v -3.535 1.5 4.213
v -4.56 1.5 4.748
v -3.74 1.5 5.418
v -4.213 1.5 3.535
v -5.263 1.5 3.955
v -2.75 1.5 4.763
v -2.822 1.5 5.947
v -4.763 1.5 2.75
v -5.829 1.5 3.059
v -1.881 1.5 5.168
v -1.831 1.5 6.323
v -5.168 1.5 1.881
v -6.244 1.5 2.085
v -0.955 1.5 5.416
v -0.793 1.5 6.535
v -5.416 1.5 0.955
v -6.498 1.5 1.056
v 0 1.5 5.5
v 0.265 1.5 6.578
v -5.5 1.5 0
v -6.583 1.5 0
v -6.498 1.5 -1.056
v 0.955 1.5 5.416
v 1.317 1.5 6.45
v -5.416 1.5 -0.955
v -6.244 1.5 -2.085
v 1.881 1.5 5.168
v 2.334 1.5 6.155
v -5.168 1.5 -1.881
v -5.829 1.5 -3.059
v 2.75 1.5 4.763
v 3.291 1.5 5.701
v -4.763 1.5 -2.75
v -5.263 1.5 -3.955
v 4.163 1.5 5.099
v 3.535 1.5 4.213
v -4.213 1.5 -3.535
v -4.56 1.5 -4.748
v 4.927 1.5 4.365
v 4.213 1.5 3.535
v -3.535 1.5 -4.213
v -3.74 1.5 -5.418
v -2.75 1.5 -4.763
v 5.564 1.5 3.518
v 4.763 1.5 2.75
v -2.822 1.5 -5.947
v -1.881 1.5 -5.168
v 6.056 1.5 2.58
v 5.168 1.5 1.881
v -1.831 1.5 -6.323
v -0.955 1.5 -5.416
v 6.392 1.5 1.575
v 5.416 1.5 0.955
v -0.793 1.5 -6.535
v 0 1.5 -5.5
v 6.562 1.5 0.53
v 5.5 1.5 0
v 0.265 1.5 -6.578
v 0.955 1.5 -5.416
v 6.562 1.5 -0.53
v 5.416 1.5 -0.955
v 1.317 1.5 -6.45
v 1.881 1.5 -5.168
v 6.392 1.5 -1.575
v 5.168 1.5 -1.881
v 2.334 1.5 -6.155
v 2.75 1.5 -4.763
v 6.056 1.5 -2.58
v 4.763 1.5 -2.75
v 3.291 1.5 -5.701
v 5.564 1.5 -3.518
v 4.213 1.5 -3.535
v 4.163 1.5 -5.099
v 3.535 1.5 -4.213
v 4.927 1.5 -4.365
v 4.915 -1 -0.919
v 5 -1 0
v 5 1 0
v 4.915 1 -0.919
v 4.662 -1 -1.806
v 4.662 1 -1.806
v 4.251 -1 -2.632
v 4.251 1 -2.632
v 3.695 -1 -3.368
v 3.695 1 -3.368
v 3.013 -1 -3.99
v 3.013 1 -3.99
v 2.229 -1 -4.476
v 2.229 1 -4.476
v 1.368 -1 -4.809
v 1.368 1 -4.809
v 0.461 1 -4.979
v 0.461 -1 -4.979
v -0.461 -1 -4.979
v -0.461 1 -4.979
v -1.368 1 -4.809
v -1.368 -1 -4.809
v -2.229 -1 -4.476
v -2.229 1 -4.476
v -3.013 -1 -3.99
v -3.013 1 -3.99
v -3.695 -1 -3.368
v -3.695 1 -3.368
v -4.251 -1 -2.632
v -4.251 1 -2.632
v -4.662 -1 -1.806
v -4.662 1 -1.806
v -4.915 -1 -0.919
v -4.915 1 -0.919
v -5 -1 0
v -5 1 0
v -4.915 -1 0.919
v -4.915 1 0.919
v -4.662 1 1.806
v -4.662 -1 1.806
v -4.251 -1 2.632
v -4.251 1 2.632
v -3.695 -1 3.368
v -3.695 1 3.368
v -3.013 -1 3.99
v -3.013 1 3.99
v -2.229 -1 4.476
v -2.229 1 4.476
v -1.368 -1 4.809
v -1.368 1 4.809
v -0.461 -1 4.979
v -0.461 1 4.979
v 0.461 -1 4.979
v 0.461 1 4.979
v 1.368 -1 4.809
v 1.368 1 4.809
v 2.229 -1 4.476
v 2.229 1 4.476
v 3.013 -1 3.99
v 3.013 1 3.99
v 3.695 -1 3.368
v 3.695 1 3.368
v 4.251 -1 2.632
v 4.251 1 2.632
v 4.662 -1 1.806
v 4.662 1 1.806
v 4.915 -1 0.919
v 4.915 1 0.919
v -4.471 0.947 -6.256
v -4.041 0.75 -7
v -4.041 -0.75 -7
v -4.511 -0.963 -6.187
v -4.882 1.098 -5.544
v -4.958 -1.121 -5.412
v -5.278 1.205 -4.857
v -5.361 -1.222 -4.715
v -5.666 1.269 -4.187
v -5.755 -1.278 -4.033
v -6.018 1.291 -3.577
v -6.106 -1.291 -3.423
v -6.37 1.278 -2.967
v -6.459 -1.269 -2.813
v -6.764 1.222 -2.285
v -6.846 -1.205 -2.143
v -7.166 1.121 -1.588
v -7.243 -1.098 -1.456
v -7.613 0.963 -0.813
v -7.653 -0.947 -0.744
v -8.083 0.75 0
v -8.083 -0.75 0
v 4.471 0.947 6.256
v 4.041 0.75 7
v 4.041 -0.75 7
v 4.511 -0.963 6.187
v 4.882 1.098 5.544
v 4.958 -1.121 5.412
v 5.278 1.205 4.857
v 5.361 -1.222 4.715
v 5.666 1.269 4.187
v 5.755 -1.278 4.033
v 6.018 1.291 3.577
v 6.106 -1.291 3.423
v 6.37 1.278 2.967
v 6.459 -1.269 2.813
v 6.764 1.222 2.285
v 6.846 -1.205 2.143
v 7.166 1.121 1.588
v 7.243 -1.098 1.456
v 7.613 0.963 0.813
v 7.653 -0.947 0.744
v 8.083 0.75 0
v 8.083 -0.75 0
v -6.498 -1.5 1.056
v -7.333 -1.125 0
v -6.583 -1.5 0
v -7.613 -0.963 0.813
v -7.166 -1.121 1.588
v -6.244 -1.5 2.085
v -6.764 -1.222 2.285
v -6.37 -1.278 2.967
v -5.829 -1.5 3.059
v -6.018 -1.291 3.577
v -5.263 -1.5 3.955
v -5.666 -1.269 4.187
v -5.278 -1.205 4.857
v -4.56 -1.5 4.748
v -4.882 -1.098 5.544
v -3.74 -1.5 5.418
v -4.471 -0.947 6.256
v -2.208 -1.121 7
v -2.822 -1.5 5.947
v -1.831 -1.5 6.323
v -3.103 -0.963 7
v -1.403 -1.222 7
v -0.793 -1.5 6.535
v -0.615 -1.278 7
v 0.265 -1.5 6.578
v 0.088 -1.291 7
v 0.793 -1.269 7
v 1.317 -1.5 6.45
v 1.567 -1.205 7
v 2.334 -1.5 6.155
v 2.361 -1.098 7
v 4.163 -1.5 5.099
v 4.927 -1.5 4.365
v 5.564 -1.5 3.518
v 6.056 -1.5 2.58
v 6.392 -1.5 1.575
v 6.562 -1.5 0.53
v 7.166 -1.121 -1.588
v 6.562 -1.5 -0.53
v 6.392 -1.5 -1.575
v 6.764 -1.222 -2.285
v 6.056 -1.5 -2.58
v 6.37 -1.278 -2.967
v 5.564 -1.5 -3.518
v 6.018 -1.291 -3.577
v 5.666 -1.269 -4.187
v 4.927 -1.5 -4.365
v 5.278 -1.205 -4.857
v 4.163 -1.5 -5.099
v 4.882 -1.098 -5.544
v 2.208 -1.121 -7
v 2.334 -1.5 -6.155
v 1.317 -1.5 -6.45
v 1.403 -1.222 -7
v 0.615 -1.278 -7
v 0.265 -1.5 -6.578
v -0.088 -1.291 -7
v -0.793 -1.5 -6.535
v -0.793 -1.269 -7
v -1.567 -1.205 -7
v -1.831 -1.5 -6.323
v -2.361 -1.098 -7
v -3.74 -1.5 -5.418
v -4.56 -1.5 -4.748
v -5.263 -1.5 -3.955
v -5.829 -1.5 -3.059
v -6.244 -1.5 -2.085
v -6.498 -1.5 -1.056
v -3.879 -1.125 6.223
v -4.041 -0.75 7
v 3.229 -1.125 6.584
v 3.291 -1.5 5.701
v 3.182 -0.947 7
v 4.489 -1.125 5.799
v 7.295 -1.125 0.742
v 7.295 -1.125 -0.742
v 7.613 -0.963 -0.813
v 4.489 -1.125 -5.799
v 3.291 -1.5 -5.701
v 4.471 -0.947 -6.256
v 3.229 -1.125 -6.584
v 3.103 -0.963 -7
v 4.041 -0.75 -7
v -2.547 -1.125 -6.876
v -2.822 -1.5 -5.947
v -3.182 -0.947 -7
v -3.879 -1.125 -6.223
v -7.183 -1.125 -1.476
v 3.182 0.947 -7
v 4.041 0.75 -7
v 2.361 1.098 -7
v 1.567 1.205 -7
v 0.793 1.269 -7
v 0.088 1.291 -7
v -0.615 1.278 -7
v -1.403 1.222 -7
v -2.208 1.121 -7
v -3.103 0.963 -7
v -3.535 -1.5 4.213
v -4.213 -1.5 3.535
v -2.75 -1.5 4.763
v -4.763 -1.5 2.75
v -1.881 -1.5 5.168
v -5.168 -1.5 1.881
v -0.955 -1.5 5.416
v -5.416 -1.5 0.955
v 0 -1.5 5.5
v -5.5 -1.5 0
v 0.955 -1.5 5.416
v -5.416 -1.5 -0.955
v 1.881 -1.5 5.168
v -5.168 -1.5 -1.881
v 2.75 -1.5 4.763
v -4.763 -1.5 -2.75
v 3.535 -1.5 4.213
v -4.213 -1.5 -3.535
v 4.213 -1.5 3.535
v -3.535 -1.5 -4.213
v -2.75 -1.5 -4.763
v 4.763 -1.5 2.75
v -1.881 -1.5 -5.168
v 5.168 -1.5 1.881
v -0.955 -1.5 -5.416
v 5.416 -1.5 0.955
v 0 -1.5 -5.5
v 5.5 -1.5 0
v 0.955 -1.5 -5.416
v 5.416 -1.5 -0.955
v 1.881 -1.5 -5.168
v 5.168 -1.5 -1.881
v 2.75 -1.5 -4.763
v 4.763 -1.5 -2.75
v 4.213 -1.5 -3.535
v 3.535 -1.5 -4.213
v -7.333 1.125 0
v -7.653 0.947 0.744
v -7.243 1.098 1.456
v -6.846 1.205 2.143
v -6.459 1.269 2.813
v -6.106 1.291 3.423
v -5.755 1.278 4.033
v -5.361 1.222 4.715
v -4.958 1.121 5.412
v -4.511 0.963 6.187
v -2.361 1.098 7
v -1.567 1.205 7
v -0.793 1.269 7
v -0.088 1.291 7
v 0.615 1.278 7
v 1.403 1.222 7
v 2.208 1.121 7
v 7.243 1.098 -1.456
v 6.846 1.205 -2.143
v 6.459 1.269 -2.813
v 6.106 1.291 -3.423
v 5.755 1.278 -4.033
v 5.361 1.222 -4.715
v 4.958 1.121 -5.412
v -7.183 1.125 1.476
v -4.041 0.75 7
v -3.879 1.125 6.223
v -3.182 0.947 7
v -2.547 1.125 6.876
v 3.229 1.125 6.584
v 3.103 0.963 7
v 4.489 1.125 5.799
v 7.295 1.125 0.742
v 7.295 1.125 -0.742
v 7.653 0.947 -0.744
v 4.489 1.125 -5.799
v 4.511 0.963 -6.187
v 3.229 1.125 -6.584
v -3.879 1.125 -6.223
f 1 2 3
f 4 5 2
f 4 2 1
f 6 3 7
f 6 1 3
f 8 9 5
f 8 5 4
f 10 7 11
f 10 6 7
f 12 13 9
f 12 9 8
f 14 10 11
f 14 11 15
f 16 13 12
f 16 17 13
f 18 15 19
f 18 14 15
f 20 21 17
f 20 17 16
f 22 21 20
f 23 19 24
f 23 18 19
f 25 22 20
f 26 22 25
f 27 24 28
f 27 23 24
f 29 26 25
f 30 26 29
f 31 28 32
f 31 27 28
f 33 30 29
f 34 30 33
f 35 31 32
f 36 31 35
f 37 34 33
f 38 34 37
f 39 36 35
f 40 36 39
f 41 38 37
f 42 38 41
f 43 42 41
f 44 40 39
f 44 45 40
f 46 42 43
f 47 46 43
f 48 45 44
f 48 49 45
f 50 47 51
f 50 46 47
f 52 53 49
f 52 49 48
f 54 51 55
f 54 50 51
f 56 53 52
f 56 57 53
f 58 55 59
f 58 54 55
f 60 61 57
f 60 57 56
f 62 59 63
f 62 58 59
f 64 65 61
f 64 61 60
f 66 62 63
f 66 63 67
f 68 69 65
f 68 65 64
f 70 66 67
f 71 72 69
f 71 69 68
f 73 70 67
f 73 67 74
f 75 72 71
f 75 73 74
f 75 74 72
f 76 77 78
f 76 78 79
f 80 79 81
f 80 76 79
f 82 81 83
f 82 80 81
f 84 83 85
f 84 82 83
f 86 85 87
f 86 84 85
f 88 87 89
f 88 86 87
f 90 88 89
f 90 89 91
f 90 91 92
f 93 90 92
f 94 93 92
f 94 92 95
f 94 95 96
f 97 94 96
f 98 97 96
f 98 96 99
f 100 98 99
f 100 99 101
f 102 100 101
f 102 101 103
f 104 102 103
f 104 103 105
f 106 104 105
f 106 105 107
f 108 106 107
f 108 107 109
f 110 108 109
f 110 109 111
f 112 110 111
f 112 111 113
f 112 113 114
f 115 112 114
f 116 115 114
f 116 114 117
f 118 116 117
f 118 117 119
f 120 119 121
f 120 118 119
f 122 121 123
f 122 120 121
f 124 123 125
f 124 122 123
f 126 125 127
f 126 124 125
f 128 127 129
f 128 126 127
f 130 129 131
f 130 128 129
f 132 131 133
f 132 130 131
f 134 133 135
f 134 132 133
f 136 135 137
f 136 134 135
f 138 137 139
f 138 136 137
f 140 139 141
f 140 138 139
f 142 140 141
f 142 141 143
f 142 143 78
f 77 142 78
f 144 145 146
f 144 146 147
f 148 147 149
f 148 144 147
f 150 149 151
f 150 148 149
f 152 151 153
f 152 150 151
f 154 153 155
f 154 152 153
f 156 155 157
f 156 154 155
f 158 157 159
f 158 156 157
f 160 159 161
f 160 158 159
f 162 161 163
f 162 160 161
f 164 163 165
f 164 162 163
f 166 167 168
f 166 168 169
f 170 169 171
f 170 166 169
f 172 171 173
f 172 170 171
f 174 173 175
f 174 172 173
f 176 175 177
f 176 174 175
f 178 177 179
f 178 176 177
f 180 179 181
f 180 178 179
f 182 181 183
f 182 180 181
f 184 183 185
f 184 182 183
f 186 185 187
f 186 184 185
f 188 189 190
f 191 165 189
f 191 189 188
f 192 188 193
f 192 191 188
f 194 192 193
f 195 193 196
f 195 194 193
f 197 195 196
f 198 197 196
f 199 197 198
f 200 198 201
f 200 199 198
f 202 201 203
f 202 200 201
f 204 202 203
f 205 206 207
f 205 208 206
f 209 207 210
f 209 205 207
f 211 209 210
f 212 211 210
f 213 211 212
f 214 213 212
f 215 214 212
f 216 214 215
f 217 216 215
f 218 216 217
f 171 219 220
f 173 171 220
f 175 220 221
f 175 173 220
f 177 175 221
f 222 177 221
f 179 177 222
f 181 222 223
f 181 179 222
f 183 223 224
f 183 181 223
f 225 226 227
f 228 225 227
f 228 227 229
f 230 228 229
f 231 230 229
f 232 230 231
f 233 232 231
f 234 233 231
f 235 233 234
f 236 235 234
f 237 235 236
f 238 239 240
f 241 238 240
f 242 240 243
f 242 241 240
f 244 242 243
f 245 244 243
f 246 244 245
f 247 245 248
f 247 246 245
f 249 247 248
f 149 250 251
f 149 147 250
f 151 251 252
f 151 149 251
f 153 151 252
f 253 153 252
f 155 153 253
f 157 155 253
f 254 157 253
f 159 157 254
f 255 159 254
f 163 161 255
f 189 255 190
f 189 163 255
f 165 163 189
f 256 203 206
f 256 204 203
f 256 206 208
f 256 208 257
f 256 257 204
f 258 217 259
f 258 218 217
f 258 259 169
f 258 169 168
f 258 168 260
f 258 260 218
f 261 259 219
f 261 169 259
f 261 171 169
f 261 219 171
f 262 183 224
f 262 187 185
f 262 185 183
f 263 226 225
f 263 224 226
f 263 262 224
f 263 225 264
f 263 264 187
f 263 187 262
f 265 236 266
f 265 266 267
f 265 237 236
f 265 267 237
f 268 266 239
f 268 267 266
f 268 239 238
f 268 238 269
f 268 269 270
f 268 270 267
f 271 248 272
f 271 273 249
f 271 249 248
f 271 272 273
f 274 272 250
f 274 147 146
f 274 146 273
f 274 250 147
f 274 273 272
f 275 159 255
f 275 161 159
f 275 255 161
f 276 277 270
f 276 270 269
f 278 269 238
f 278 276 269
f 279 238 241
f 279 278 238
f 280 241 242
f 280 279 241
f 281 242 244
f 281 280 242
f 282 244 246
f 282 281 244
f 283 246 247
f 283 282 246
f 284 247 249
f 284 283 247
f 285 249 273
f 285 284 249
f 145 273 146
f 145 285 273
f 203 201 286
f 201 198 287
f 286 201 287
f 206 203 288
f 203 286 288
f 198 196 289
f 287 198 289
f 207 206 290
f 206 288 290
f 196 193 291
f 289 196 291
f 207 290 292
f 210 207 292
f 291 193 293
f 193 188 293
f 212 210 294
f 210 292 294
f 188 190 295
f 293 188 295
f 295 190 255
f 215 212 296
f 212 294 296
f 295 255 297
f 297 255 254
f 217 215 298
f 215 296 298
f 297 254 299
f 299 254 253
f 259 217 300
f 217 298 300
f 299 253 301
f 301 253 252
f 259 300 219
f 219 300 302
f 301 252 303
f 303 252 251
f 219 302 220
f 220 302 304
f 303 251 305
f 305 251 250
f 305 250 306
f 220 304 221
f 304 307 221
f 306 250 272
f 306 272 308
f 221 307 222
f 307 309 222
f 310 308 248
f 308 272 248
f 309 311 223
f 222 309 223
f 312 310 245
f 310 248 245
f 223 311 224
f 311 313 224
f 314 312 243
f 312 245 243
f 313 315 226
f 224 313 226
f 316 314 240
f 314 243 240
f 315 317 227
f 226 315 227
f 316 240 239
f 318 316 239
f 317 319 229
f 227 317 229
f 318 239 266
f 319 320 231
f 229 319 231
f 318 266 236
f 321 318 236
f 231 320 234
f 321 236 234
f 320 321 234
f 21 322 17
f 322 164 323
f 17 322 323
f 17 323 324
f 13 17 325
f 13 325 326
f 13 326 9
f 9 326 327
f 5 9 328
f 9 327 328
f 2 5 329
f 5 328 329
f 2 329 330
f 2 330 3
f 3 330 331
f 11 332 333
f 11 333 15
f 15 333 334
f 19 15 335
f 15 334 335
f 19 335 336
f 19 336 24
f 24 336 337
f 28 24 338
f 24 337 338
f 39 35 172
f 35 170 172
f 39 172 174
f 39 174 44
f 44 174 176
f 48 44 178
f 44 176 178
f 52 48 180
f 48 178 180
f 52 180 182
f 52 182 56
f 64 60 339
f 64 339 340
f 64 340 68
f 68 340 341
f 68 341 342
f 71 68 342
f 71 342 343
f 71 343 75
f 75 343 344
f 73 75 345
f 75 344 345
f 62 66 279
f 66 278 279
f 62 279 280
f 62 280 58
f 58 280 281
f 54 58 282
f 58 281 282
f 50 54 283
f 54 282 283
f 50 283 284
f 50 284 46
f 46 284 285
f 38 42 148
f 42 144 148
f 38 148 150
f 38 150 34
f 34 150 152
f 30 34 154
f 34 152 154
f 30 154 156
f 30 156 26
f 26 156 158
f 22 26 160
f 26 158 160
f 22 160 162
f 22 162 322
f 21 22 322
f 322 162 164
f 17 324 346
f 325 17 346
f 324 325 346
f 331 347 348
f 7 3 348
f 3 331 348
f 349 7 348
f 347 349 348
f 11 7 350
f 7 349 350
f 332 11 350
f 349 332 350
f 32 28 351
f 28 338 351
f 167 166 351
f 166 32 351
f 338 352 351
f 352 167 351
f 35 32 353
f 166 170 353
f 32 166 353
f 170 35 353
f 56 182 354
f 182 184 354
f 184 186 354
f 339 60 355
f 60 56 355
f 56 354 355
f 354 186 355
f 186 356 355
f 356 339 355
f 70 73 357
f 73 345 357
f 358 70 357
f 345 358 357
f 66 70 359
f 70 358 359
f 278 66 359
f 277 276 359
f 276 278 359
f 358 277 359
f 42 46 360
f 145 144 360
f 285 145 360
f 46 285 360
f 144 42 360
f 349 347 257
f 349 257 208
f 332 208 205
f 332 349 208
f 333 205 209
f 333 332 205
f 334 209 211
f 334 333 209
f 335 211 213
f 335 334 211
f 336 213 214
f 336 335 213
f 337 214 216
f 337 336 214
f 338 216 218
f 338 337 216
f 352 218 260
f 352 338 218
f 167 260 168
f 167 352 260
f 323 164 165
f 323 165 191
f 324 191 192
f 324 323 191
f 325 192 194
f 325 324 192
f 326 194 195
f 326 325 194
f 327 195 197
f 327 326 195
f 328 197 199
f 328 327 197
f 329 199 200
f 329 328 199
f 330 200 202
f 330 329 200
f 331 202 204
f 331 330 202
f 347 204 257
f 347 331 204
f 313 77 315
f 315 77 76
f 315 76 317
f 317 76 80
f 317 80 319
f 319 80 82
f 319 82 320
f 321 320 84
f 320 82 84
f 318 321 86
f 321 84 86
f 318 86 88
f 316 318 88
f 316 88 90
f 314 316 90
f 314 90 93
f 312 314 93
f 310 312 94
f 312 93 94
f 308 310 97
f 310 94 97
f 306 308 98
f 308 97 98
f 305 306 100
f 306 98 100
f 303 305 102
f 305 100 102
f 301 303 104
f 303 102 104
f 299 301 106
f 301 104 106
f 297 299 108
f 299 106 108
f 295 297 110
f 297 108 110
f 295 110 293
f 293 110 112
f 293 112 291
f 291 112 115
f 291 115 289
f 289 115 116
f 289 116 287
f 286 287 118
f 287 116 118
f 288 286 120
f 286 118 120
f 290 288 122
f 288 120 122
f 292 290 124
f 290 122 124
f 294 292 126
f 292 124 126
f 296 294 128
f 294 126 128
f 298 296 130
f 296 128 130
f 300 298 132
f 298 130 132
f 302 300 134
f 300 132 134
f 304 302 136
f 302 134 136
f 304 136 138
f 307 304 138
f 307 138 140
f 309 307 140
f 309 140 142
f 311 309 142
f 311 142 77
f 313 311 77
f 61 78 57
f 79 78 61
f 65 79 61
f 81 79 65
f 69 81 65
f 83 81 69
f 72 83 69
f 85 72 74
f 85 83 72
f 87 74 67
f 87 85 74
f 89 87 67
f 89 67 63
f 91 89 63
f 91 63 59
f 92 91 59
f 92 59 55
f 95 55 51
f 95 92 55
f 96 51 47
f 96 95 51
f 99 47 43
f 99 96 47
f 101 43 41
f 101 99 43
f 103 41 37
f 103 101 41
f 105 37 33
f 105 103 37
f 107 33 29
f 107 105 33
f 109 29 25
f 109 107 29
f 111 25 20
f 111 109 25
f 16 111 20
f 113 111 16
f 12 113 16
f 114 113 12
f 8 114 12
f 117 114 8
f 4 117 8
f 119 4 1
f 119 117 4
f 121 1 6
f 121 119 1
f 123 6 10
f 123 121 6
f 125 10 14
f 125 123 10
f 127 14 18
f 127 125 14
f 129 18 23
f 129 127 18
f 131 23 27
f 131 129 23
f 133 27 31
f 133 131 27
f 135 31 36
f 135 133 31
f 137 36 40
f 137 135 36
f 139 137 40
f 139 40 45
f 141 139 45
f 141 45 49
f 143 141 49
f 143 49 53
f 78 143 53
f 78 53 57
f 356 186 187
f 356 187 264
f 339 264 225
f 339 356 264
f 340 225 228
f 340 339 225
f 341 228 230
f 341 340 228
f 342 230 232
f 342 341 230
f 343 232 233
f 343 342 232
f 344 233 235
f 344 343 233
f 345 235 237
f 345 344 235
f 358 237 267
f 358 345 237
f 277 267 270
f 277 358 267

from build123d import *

# Parameters (mm, degrees)
SKETCH1_R           = 5
BOSS_EXTRUDE1_DEPTH = 1.5
CHAMFER1_SIZE       = 0.5


with BuildPart() as part:
    # Sketch1 → Boss-Extrude1 (new body, symmetric)
    with BuildSketch(Plane(origin=(0, 0, 0), x_dir=(1, 0, 0), z_dir=(0, 1, 0))):
        Polygon((8.082903769, 0), (4.041451884, 7), (-4.041451884, 7), (-8.082903769, 0), (-4.041451884, -7), (4.041451884, -7), align=None)
        Circle(SKETCH1_R, mode=Mode.SUBTRACT)
    extrude(amount=BOSS_EXTRUDE1_DEPTH, both=True)

    # Sketch2 → Cut-Revolve1 (revolve, cut)
    with BuildSketch(Plane.XY):
        Polygon((-8.082903769, 1.5), (-6.582903769, 1.5), (-8.082903769, 0.75), align=None)
        Polygon((-8.082903769, -0.75), (-8.082903769, -1.5), (-6.582903769, -1.5), align=None)
    revolve(axis=Axis((0, -1000, 0), (0, 1, 0)), mode=Mode.SUBTRACT)

    # Chamfer1
    chamfer1_edges = [part.edges().sort_by_distance(p)[0] for p in [
        (-5, -1.5, 0),
        (-5, 1.5, 0),
    ]]
    chamfer(chamfer1_edges, length=CHAMFER1_SIZE)


solid = part.part
